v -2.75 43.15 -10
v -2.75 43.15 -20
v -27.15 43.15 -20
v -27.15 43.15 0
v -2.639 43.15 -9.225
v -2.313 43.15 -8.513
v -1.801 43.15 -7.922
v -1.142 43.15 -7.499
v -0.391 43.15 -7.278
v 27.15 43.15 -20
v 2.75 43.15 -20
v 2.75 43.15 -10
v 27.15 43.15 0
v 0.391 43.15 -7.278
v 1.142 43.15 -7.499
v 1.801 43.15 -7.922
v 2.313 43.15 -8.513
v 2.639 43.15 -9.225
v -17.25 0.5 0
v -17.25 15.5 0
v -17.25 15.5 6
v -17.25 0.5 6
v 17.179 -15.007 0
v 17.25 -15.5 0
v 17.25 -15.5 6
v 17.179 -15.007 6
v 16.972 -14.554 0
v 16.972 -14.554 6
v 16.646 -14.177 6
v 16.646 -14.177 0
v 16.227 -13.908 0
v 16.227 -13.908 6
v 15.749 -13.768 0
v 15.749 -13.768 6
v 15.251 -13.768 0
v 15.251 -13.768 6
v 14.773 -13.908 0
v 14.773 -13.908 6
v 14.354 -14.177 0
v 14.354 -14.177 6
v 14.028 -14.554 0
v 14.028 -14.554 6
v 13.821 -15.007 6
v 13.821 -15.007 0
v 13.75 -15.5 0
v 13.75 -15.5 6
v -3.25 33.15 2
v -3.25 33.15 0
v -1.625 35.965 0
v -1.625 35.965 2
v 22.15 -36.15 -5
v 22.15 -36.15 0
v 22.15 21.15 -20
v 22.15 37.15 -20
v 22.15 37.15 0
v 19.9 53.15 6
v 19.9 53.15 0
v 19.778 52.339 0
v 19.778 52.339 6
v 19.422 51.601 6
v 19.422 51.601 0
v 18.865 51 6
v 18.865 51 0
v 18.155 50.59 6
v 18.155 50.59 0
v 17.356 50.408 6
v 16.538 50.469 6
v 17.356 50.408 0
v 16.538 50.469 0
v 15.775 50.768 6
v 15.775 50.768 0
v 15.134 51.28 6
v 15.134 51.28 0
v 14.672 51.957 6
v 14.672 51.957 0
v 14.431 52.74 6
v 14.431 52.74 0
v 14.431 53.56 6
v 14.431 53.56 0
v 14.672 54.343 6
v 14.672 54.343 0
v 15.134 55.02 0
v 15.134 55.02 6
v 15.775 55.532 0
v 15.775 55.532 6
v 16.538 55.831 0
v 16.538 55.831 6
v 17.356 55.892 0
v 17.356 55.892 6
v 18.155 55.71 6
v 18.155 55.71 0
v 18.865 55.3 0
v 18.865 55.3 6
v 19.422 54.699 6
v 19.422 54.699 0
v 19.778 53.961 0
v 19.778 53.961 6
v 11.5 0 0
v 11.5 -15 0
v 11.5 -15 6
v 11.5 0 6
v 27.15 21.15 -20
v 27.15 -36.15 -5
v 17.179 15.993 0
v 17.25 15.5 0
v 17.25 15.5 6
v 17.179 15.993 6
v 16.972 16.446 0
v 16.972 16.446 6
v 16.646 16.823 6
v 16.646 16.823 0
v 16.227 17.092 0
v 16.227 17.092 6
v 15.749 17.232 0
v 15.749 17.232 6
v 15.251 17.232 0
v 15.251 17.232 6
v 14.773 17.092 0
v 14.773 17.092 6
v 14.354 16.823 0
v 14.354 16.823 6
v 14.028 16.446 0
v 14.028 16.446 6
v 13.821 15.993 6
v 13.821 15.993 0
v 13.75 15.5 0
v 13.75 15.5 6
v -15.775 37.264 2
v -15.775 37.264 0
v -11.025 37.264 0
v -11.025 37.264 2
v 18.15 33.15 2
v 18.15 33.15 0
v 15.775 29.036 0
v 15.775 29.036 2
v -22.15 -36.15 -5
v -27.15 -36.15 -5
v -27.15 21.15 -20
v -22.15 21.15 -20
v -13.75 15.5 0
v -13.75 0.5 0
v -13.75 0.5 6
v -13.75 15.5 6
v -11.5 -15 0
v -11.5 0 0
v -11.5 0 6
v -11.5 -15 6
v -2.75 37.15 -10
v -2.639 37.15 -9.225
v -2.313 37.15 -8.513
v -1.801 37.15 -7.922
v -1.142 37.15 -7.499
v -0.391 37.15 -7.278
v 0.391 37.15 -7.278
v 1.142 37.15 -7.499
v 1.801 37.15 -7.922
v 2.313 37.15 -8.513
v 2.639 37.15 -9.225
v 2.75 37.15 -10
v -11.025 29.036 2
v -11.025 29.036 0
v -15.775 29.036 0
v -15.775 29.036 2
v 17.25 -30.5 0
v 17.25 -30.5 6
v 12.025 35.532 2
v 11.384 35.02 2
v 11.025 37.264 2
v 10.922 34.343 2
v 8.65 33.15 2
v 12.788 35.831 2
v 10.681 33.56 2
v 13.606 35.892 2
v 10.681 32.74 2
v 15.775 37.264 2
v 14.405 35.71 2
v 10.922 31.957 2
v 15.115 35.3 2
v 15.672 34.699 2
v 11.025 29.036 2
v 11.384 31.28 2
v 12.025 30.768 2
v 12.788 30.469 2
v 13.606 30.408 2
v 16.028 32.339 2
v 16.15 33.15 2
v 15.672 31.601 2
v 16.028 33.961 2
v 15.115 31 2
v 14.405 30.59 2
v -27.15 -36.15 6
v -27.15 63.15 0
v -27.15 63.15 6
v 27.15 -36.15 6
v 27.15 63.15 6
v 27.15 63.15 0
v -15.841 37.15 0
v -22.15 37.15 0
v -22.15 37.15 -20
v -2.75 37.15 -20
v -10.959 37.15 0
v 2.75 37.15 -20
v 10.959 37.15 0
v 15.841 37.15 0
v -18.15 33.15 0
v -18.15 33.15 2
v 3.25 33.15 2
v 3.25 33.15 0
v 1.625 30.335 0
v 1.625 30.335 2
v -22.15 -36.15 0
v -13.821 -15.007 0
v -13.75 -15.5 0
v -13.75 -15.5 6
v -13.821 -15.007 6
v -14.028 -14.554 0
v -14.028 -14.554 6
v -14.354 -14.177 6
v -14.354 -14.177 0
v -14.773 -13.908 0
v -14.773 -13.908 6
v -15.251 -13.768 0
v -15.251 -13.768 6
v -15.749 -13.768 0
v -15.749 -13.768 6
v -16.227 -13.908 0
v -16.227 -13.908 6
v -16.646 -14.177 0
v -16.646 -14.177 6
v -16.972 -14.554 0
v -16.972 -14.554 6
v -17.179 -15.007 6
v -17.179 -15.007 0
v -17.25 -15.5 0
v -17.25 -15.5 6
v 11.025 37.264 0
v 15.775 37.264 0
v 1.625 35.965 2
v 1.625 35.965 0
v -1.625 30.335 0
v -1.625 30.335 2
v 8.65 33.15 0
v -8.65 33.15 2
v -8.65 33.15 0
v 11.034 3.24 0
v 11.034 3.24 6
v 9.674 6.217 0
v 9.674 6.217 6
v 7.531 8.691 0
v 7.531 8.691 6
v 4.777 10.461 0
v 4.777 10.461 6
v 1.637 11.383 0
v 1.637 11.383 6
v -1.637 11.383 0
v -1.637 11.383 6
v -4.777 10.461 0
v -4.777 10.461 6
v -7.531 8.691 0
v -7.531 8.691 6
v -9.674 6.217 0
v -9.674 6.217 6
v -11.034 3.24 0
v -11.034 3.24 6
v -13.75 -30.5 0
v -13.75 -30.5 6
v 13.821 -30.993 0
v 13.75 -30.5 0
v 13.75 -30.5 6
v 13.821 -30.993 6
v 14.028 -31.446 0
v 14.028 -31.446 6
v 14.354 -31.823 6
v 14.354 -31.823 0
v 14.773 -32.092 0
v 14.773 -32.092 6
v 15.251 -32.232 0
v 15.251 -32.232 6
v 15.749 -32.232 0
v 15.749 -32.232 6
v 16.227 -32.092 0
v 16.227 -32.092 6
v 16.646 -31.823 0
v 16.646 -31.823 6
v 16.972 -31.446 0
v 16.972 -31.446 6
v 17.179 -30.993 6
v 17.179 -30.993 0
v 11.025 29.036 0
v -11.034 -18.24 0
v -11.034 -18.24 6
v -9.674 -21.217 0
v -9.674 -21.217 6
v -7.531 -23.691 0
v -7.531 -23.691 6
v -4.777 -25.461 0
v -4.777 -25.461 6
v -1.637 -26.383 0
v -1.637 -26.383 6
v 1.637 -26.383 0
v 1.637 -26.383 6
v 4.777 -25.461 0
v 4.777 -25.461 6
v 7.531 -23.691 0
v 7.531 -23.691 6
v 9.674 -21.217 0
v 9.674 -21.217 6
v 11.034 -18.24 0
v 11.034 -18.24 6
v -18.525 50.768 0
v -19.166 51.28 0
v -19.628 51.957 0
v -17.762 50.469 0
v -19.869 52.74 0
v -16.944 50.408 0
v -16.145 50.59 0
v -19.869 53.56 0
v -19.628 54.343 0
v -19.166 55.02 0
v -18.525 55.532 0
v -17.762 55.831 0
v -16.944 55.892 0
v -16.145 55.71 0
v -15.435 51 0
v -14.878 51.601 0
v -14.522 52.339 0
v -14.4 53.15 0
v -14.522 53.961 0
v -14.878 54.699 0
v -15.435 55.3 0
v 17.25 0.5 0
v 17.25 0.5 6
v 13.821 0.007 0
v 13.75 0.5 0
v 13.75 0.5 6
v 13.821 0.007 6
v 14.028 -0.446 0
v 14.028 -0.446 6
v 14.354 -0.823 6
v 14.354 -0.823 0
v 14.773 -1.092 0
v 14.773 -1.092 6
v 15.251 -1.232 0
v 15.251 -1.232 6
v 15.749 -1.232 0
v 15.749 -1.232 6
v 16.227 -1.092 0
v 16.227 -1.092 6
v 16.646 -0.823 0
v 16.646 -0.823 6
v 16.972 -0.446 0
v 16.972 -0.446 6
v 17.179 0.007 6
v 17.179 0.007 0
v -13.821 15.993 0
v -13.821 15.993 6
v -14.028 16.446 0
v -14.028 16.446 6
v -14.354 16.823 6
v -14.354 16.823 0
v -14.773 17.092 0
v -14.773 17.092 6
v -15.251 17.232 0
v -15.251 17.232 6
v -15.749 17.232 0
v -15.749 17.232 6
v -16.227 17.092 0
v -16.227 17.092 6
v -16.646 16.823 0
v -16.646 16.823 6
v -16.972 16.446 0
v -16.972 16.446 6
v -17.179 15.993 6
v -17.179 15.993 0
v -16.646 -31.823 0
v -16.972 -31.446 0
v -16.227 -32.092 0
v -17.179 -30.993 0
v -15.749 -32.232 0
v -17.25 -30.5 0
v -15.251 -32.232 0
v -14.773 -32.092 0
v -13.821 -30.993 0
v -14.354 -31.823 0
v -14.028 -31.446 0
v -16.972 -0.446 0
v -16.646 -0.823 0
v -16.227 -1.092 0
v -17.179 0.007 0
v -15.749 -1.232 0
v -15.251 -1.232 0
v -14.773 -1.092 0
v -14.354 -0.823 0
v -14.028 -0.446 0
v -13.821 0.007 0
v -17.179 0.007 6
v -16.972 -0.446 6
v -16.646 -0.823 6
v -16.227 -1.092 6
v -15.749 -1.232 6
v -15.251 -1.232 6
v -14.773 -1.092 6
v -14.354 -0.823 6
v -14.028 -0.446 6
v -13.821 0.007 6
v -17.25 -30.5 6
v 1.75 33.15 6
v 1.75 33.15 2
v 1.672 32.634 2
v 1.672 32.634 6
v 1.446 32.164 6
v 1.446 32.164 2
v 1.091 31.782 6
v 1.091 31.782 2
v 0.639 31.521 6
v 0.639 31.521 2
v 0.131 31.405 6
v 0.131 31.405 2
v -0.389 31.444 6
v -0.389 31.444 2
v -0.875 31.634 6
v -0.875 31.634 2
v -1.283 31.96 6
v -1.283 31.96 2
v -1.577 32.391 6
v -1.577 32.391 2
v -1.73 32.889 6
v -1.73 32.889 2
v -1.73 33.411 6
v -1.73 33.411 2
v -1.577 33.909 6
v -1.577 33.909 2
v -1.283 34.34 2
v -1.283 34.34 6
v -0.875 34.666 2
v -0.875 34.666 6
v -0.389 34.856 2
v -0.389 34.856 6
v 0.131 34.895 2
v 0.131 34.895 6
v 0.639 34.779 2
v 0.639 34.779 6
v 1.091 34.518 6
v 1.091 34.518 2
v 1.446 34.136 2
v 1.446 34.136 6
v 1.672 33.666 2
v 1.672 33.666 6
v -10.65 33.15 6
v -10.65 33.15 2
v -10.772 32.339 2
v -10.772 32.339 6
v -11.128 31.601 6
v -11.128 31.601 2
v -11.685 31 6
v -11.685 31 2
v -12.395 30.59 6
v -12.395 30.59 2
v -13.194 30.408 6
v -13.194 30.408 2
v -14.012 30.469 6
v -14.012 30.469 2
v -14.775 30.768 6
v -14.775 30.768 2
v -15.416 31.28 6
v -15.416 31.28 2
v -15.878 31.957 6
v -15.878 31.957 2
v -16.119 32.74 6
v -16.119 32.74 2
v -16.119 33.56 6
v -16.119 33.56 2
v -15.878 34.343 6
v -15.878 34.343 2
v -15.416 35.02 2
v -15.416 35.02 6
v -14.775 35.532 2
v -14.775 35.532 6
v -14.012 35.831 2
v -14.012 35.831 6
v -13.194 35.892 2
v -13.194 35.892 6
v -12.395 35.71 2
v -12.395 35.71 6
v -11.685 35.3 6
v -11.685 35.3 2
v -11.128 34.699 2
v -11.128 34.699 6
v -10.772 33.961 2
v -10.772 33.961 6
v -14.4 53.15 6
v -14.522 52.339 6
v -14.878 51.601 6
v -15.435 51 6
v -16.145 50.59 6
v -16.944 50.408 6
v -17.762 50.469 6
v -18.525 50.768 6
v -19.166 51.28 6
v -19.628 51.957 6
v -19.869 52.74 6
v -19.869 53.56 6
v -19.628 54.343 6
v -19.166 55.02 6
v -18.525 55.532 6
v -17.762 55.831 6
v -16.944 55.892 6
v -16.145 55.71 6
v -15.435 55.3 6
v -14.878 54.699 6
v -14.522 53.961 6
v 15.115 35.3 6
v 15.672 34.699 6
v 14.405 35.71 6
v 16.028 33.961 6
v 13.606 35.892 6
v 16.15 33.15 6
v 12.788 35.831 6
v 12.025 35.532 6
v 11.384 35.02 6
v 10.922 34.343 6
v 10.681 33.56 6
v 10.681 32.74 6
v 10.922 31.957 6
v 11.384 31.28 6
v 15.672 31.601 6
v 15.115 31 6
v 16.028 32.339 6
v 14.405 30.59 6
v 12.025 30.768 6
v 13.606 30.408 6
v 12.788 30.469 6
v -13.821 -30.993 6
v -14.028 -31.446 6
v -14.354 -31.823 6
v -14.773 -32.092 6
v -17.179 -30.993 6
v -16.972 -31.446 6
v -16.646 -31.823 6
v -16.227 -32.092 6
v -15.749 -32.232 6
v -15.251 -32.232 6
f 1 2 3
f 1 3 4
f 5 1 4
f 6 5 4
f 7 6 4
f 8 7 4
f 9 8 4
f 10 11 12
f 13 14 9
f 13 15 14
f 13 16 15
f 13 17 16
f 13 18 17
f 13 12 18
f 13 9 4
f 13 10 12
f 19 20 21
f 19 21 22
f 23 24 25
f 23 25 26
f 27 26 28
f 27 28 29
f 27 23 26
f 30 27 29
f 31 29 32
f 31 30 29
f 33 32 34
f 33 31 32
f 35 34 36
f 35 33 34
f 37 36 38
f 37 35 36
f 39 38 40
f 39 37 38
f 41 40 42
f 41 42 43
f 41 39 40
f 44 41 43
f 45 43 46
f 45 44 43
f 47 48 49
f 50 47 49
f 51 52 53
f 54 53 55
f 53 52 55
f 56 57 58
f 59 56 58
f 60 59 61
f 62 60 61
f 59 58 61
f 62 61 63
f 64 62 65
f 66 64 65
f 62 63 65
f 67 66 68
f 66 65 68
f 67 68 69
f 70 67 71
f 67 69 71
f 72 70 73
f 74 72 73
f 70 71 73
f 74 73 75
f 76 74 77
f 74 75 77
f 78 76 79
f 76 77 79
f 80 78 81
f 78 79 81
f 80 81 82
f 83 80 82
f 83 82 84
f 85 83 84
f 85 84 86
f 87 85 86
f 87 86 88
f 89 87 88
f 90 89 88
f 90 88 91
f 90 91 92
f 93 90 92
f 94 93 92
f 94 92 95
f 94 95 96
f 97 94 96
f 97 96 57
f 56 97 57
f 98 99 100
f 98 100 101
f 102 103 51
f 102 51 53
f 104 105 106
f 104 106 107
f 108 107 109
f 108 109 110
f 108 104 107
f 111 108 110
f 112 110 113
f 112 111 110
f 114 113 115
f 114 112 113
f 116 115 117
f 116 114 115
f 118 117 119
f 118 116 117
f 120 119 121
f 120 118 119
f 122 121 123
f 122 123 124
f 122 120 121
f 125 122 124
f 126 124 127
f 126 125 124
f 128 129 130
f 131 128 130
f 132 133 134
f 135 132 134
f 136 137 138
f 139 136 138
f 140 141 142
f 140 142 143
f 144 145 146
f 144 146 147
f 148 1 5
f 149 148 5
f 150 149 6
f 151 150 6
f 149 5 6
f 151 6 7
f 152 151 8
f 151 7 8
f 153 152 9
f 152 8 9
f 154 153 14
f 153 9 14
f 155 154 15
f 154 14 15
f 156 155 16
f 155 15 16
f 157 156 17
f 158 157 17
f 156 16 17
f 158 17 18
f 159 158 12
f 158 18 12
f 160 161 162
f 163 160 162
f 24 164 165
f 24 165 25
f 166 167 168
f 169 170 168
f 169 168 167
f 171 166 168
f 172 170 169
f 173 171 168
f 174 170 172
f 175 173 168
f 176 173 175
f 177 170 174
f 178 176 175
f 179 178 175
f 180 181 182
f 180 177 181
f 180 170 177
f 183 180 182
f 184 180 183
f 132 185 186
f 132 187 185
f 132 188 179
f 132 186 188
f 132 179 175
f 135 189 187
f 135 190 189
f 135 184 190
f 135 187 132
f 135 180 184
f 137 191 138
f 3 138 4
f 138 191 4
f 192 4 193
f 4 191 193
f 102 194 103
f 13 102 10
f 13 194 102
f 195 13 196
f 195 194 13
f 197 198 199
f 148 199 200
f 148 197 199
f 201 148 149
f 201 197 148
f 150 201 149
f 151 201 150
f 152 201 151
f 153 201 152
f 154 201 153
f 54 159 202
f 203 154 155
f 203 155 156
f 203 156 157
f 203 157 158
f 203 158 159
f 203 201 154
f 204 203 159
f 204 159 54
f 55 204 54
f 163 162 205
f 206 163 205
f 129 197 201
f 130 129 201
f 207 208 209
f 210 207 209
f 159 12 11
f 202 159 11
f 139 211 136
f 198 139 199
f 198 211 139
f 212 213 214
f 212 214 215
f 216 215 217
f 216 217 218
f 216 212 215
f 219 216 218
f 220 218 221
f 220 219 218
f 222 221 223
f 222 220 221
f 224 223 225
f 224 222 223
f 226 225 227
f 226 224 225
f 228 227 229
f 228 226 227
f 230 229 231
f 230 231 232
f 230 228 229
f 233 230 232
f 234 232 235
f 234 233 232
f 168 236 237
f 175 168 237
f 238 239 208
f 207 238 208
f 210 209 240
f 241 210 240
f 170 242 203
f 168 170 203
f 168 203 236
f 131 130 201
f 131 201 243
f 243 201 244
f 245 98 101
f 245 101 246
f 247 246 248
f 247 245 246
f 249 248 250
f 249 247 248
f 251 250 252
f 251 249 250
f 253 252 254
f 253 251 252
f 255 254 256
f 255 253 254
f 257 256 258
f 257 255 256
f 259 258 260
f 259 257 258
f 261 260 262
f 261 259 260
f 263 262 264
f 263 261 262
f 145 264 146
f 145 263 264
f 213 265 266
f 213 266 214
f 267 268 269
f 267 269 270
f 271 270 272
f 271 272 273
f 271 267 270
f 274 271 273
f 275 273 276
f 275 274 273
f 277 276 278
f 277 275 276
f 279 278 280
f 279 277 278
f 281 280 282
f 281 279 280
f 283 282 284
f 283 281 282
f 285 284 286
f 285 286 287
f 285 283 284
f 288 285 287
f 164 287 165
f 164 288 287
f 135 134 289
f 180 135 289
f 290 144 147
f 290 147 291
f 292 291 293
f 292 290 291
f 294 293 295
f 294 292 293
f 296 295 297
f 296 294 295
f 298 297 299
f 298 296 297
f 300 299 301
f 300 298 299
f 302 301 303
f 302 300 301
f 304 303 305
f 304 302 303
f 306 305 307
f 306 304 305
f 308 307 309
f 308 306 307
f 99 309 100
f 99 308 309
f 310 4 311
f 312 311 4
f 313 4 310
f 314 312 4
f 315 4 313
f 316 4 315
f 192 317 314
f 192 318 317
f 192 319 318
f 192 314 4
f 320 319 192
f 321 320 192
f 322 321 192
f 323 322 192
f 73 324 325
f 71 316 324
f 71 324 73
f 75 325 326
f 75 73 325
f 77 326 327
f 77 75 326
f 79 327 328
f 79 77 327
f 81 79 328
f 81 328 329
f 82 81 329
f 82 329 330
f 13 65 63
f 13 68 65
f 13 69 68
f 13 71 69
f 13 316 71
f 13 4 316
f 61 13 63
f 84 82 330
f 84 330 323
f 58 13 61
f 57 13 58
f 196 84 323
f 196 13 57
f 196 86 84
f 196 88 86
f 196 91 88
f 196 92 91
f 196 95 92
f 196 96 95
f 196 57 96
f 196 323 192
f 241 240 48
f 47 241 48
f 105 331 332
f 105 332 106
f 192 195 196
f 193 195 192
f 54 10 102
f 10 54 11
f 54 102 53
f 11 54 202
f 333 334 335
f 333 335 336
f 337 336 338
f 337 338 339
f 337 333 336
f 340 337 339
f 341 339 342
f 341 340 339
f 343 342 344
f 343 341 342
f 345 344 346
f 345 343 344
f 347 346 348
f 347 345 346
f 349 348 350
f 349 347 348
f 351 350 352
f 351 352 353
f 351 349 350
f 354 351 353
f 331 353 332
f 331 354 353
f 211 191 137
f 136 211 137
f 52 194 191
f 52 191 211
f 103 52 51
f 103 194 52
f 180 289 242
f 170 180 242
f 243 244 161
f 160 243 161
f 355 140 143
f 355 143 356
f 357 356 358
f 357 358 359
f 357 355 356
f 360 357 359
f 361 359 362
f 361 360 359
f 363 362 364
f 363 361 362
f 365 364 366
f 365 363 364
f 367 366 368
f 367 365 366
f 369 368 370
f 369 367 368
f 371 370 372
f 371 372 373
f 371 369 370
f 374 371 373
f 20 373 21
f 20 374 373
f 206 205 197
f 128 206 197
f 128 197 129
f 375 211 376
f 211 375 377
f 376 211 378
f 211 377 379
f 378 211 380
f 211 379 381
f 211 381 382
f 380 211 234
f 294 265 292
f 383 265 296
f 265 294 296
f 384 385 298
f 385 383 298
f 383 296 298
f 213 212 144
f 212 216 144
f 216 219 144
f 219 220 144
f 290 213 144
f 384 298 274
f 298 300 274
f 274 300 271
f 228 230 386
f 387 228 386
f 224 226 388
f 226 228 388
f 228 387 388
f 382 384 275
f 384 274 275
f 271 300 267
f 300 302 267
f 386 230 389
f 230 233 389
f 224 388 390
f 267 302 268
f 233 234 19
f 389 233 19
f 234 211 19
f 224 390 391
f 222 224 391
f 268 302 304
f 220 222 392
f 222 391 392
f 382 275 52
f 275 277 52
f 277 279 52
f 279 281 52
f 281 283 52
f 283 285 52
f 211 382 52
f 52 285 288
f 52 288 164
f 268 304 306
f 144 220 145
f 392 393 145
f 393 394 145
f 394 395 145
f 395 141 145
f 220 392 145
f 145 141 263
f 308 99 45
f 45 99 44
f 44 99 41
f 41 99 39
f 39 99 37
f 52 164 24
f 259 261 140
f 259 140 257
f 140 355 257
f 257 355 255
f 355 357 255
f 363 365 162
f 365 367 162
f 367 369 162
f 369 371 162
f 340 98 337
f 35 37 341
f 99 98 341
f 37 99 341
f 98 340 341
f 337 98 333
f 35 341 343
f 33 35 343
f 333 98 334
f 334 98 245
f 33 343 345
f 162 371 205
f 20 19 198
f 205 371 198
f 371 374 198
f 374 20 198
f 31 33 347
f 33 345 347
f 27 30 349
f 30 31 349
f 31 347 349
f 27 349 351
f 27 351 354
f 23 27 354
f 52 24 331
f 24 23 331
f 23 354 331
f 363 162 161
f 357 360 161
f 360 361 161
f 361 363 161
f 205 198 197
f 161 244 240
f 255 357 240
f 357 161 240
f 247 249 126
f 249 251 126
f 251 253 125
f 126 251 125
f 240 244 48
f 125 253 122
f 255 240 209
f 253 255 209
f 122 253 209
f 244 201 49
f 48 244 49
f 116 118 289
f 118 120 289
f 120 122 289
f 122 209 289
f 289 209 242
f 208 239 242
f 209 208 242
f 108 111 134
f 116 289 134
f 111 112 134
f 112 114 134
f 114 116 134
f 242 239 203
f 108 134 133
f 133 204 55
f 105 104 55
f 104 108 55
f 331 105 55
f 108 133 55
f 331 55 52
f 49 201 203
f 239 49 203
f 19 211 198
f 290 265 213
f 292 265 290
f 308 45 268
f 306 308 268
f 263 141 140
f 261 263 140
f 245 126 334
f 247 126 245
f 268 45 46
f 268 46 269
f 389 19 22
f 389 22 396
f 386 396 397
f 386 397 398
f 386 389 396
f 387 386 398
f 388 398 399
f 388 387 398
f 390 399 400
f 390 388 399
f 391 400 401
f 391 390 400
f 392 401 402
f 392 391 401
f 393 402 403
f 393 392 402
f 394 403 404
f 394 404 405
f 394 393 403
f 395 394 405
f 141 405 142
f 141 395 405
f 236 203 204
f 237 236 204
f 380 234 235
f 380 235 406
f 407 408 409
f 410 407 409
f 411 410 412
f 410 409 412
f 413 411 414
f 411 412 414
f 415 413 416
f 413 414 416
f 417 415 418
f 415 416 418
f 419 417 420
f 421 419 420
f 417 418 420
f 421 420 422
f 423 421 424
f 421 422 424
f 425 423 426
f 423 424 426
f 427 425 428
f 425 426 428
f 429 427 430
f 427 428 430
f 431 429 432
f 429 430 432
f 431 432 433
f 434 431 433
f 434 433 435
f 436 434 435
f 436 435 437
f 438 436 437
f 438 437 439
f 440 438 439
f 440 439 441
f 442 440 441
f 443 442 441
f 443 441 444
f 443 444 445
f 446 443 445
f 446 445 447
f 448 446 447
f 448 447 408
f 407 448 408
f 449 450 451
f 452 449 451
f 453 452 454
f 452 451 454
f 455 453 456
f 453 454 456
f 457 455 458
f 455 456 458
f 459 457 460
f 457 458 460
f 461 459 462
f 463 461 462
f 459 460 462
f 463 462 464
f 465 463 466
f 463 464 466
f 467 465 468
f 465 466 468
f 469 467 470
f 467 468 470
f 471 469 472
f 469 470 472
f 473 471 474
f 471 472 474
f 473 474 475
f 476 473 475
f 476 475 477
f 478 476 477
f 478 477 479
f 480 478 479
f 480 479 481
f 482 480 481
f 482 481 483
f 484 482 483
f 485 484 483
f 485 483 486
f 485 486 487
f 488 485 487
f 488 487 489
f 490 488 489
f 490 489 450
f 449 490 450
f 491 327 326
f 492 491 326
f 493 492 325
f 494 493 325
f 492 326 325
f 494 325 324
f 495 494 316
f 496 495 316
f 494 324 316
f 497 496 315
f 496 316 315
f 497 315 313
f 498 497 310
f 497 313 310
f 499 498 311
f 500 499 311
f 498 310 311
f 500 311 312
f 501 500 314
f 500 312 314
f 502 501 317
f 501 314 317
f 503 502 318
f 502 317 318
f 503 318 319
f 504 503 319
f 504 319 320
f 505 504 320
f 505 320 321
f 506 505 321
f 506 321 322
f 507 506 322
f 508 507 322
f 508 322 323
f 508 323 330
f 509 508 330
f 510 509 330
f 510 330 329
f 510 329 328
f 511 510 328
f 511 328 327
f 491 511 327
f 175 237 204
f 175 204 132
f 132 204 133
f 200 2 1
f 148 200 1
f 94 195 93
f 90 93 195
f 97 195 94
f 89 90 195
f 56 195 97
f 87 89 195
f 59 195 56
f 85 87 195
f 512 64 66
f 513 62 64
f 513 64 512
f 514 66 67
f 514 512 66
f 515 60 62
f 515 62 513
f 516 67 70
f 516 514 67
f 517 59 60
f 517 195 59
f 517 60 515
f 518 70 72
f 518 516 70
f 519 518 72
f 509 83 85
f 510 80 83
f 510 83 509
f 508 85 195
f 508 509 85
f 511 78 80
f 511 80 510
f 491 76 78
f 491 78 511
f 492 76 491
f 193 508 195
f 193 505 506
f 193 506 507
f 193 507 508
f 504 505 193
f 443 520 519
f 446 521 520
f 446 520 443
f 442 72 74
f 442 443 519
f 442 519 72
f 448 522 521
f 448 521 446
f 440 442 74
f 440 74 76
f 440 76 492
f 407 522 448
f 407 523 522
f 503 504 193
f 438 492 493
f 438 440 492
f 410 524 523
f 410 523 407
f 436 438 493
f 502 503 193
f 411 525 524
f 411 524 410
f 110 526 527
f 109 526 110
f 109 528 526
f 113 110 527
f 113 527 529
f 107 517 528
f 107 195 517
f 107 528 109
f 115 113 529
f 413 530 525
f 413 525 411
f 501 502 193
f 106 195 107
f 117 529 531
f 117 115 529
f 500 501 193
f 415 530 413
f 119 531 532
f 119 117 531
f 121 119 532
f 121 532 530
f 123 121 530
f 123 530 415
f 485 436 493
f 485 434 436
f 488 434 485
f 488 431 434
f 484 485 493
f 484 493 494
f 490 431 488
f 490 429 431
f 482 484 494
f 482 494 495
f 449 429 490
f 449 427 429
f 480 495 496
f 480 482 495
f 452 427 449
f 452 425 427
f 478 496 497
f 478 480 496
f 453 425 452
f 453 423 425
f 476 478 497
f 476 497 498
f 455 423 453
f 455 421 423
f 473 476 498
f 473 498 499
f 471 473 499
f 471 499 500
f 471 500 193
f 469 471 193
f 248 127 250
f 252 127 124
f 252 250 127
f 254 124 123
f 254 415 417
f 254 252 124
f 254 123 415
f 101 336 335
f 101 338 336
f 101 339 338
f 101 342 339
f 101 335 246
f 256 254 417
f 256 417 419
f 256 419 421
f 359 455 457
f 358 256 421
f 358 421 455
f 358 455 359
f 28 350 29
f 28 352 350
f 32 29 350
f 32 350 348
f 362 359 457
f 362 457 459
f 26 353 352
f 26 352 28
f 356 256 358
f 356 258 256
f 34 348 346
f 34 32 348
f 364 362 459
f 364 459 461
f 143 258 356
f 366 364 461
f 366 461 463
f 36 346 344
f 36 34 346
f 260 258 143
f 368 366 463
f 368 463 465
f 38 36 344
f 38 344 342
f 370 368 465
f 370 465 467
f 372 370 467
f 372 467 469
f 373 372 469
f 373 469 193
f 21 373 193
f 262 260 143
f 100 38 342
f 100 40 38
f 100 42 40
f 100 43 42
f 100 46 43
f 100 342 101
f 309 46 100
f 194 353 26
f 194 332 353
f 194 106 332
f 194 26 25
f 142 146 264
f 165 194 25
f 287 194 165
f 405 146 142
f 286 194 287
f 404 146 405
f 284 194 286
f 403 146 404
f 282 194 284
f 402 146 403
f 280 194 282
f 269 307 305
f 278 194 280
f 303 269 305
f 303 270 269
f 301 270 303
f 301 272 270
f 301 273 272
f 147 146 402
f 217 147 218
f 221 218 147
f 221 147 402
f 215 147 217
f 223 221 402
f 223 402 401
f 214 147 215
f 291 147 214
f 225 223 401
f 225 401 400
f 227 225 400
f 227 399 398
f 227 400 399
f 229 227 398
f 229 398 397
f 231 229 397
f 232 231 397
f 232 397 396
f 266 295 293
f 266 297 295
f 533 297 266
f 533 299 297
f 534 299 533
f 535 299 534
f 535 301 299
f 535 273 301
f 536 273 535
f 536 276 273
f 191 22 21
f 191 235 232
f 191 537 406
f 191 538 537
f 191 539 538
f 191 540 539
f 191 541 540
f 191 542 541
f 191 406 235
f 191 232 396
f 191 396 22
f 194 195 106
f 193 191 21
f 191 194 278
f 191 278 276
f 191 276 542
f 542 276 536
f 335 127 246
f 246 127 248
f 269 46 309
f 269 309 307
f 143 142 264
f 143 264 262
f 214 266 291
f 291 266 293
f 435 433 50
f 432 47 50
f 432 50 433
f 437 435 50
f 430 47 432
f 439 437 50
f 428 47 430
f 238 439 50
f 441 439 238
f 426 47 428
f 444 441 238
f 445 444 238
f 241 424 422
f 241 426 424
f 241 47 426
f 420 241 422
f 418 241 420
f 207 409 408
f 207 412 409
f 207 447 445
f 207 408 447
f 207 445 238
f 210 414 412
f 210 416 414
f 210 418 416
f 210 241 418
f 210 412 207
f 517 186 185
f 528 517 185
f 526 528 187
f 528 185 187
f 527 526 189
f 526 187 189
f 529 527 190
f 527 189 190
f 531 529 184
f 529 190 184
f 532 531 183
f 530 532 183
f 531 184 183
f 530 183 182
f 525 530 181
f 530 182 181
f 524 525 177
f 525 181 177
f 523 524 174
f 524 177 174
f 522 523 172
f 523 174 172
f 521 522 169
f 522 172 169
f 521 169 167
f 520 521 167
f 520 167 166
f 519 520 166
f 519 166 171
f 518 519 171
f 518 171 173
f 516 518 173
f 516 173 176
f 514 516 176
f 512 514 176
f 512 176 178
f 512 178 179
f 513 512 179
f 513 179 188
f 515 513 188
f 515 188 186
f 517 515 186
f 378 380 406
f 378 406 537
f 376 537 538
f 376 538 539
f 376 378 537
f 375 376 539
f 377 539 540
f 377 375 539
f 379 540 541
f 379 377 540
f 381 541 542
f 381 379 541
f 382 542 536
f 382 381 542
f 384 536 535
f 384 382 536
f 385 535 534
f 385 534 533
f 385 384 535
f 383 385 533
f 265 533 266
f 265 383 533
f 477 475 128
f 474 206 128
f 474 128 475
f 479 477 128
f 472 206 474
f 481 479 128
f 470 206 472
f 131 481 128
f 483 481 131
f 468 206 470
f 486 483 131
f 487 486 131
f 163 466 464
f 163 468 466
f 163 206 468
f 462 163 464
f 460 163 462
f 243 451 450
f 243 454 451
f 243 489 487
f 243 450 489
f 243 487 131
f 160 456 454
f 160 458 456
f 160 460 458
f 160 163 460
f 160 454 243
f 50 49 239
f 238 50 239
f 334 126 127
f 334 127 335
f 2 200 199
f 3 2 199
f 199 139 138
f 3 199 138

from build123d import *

# Parameters (mm, degrees)
SKETCH_W        = 54.3
SKETCH_H        = 57.3
PAD_DEPTH       = 6
SKETCH001_W     = 54.3
SKETCH001_H     = 26
PAD001_DEPTH    = 42
SKETCH002_W     = 20
SKETCH002_H     = 20
POCKET_DEPTH    = 54.301
PAD002_DEPTH    = 5
SKETCH004_R     = 2.75
POCKET001_DEPTH = 6.001
SKETCH005_W     = 44.3
SKETCH005_H     = 20
POCKET002_DEPTH = 16
SKETCH006_R     = 2.75
SKETCH006_R_2   = 1.75
POCKET003_DEPTH = 6.001
POCKET004_DEPTH = 2
POCKET005_DEPTH = 79.301


with BuildPart() as part:
    # Sketch → Pad (new body)
    with BuildSketch(Plane.XY):
        with Locations((0, -7.5)):
            Rectangle(SKETCH_W, SKETCH_H)
        with BuildLine():
            ThreePointArc((-13.75, 15.5), (-15.5, 17.25), (-17.25, 15.5))
            Line((-17.25, 15.5), (-17.25, 0.5))
            ThreePointArc((-17.25, 0.5), (-15.5, -1.25), (-13.75, 0.5))
            Line((-13.75, 0.5), (-13.75, 15.5))
        make_face(mode=Mode.SUBTRACT)
        with BuildLine():
            ThreePointArc((17.25, 15.5), (15.5, 17.25), (13.75, 15.5))
            Line((13.75, 15.5), (13.75, 0.5))
            ThreePointArc((13.75, 0.5), (15.5, -1.25), (17.25, 0.5))
            Line((17.25, 0.5), (17.25, 15.5))
        make_face(mode=Mode.SUBTRACT)
        with BuildLine():
            ThreePointArc((-13.75, -15.5), (-15.5, -13.75), (-17.25, -15.5))
            Line((-17.25, -15.5), (-17.25, -30.5))
            ThreePointArc((-17.25, -30.5), (-15.5, -32.25), (-13.75, -30.5))
            Line((-13.75, -30.5), (-13.75, -15.5))
        make_face(mode=Mode.SUBTRACT)
        with BuildLine():
            ThreePointArc((17.25, -15.5), (15.5, -13.75), (13.75, -15.5))
            Line((13.75, -15.5), (13.75, -30.5))
            ThreePointArc((13.75, -30.5), (15.5, -32.25), (17.25, -30.5))
            Line((17.25, -30.5), (17.25, -15.5))
        make_face(mode=Mode.SUBTRACT)
        with BuildLine():
            ThreePointArc((11.5, 0), (0, 11.5), (-11.5, 0))
            Line((-11.5, 0), (-11.5, -15))
            ThreePointArc((-11.5, -15), (0, -26.5), (11.5, -15))
            Line((11.5, -15), (11.5, 0))
        make_face(mode=Mode.SUBTRACT)
    extrude(amount=PAD_DEPTH)

    # Sketch001 (on Face1 of Pad) → Pad001 (join)
    with BuildSketch(Plane(origin=(0, 21.15, 0), x_dir=(-1, 0, 0), z_dir=(0, 1, 0))):
        with Locations((0, -7)):
            Rectangle(SKETCH001_W, SKETCH001_H)
    extrude(amount=PAD001_DEPTH)

    # Sketch002 (on Face26 of Pad001) → Pocket (cut, through all)
    with BuildSketch(Plane.YZ.offset(27.15)):
        with Locations((53.15, -10)):
            Rectangle(SKETCH002_W, SKETCH002_H)
    extrude(amount=-POCKET_DEPTH, mode=Mode.SUBTRACT)

    # Sketch003 (on Face3 of Pocket) → Pad002 (join)
    with BuildSketch(Plane(origin=(-27.15, 0, 0), x_dir=(0, -1, 0), z_dir=(-1, 0, 0))):
        Polygon((36.15, 0), (36.15, -5), (-21.15, -20), (-21.15, 0), align=None)
    pad002 = extrude(amount=-PAD002_DEPTH)

    # Mirrored: Pad002 across YZ
    add(pad002.mirror(Plane.YZ))

    # Sketch004 (on Face5 of Mirrored) → Pocket001 (cut, through all)
    with BuildSketch(Plane(origin=(0, 0, 0), x_dir=(1, 0, 0), z_dir=(0, 0, -1))):
        with Locations((-17.15, -53.15)):
            Circle(SKETCH004_R)
        with Locations((17.15, -53.15)):
            Circle(SKETCH004_R)
    extrude(amount=-POCKET001_DEPTH, mode=Mode.SUBTRACT)

    # Sketch005 (on Face5 of Pocket001) → Pocket002 (cut)
    with BuildSketch(Plane.XZ.offset(-21.15)):
        with Locations((0, -10)):
            Rectangle(SKETCH005_W, SKETCH005_H)
    extrude(amount=-POCKET002_DEPTH, mode=Mode.SUBTRACT)

    # Sketch006 (on Face5 of Pocket002) → Pocket003 (cut, through all)
    with BuildSketch(Plane(origin=(0, 0, 0), x_dir=(1, 0, 0), z_dir=(0, 0, -1))):
        with Locations((-13.4, -33.15)):
            Circle(SKETCH006_R)
        with Locations((13.4, -33.15)):
            Circle(SKETCH006_R)
        with Locations((0, -33.15)):
            Circle(SKETCH006_R_2)
    extrude(amount=-POCKET003_DEPTH, mode=Mode.SUBTRACT)

    # Sketch007 (on Face37 of Pocket003) → Pocket004 (cut)
    with BuildSketch(Plane(origin=(0, 0, 0), x_dir=(1, 0, 0), z_dir=(0, 0, -1))):
        Polygon((18.15, -33.15), (15.775, -29.036379), (11.025, -29.036379), (8.65, -33.15), (11.025, -37.263621), (15.775, -37.263621), align=None)
        Polygon((-8.65, -33.15), (-11.025, -29.036379), (-15.775, -29.036379), (-18.15, -33.15), (-15.775, -37.263621), (-11.025, -37.263621), align=None)
        Polygon((3.25, -33.15), (1.625, -30.335417), (-1.625, -30.335417), (-3.25, -33.15), (-1.625, -35.964583), (1.625, -35.964583), align=None)
    extrude(amount=-POCKET004_DEPTH, mode=Mode.SUBTRACT)

    # Sketch008 (on Face48 of Pocket004) → Pocket005 (cut, through all)
    with BuildSketch(Plane(origin=(0, 43.15, 0), x_dir=(-1, 0, 0), z_dir=(0, 1, 0))):
        with BuildLine():
            ThreePointArc((2.75, -10), (0, -7.25), (-2.75, -10))
            Line((-2.75, -10), (-2.75, -30))
            ThreePointArc((-2.75, -30), (0, -32.75), (2.75, -30))
            Line((2.75, -30), (2.75, -10))
        make_face()
    extrude(amount=-POCKET005_DEPTH, mode=Mode.SUBTRACT)


solid = part.part
